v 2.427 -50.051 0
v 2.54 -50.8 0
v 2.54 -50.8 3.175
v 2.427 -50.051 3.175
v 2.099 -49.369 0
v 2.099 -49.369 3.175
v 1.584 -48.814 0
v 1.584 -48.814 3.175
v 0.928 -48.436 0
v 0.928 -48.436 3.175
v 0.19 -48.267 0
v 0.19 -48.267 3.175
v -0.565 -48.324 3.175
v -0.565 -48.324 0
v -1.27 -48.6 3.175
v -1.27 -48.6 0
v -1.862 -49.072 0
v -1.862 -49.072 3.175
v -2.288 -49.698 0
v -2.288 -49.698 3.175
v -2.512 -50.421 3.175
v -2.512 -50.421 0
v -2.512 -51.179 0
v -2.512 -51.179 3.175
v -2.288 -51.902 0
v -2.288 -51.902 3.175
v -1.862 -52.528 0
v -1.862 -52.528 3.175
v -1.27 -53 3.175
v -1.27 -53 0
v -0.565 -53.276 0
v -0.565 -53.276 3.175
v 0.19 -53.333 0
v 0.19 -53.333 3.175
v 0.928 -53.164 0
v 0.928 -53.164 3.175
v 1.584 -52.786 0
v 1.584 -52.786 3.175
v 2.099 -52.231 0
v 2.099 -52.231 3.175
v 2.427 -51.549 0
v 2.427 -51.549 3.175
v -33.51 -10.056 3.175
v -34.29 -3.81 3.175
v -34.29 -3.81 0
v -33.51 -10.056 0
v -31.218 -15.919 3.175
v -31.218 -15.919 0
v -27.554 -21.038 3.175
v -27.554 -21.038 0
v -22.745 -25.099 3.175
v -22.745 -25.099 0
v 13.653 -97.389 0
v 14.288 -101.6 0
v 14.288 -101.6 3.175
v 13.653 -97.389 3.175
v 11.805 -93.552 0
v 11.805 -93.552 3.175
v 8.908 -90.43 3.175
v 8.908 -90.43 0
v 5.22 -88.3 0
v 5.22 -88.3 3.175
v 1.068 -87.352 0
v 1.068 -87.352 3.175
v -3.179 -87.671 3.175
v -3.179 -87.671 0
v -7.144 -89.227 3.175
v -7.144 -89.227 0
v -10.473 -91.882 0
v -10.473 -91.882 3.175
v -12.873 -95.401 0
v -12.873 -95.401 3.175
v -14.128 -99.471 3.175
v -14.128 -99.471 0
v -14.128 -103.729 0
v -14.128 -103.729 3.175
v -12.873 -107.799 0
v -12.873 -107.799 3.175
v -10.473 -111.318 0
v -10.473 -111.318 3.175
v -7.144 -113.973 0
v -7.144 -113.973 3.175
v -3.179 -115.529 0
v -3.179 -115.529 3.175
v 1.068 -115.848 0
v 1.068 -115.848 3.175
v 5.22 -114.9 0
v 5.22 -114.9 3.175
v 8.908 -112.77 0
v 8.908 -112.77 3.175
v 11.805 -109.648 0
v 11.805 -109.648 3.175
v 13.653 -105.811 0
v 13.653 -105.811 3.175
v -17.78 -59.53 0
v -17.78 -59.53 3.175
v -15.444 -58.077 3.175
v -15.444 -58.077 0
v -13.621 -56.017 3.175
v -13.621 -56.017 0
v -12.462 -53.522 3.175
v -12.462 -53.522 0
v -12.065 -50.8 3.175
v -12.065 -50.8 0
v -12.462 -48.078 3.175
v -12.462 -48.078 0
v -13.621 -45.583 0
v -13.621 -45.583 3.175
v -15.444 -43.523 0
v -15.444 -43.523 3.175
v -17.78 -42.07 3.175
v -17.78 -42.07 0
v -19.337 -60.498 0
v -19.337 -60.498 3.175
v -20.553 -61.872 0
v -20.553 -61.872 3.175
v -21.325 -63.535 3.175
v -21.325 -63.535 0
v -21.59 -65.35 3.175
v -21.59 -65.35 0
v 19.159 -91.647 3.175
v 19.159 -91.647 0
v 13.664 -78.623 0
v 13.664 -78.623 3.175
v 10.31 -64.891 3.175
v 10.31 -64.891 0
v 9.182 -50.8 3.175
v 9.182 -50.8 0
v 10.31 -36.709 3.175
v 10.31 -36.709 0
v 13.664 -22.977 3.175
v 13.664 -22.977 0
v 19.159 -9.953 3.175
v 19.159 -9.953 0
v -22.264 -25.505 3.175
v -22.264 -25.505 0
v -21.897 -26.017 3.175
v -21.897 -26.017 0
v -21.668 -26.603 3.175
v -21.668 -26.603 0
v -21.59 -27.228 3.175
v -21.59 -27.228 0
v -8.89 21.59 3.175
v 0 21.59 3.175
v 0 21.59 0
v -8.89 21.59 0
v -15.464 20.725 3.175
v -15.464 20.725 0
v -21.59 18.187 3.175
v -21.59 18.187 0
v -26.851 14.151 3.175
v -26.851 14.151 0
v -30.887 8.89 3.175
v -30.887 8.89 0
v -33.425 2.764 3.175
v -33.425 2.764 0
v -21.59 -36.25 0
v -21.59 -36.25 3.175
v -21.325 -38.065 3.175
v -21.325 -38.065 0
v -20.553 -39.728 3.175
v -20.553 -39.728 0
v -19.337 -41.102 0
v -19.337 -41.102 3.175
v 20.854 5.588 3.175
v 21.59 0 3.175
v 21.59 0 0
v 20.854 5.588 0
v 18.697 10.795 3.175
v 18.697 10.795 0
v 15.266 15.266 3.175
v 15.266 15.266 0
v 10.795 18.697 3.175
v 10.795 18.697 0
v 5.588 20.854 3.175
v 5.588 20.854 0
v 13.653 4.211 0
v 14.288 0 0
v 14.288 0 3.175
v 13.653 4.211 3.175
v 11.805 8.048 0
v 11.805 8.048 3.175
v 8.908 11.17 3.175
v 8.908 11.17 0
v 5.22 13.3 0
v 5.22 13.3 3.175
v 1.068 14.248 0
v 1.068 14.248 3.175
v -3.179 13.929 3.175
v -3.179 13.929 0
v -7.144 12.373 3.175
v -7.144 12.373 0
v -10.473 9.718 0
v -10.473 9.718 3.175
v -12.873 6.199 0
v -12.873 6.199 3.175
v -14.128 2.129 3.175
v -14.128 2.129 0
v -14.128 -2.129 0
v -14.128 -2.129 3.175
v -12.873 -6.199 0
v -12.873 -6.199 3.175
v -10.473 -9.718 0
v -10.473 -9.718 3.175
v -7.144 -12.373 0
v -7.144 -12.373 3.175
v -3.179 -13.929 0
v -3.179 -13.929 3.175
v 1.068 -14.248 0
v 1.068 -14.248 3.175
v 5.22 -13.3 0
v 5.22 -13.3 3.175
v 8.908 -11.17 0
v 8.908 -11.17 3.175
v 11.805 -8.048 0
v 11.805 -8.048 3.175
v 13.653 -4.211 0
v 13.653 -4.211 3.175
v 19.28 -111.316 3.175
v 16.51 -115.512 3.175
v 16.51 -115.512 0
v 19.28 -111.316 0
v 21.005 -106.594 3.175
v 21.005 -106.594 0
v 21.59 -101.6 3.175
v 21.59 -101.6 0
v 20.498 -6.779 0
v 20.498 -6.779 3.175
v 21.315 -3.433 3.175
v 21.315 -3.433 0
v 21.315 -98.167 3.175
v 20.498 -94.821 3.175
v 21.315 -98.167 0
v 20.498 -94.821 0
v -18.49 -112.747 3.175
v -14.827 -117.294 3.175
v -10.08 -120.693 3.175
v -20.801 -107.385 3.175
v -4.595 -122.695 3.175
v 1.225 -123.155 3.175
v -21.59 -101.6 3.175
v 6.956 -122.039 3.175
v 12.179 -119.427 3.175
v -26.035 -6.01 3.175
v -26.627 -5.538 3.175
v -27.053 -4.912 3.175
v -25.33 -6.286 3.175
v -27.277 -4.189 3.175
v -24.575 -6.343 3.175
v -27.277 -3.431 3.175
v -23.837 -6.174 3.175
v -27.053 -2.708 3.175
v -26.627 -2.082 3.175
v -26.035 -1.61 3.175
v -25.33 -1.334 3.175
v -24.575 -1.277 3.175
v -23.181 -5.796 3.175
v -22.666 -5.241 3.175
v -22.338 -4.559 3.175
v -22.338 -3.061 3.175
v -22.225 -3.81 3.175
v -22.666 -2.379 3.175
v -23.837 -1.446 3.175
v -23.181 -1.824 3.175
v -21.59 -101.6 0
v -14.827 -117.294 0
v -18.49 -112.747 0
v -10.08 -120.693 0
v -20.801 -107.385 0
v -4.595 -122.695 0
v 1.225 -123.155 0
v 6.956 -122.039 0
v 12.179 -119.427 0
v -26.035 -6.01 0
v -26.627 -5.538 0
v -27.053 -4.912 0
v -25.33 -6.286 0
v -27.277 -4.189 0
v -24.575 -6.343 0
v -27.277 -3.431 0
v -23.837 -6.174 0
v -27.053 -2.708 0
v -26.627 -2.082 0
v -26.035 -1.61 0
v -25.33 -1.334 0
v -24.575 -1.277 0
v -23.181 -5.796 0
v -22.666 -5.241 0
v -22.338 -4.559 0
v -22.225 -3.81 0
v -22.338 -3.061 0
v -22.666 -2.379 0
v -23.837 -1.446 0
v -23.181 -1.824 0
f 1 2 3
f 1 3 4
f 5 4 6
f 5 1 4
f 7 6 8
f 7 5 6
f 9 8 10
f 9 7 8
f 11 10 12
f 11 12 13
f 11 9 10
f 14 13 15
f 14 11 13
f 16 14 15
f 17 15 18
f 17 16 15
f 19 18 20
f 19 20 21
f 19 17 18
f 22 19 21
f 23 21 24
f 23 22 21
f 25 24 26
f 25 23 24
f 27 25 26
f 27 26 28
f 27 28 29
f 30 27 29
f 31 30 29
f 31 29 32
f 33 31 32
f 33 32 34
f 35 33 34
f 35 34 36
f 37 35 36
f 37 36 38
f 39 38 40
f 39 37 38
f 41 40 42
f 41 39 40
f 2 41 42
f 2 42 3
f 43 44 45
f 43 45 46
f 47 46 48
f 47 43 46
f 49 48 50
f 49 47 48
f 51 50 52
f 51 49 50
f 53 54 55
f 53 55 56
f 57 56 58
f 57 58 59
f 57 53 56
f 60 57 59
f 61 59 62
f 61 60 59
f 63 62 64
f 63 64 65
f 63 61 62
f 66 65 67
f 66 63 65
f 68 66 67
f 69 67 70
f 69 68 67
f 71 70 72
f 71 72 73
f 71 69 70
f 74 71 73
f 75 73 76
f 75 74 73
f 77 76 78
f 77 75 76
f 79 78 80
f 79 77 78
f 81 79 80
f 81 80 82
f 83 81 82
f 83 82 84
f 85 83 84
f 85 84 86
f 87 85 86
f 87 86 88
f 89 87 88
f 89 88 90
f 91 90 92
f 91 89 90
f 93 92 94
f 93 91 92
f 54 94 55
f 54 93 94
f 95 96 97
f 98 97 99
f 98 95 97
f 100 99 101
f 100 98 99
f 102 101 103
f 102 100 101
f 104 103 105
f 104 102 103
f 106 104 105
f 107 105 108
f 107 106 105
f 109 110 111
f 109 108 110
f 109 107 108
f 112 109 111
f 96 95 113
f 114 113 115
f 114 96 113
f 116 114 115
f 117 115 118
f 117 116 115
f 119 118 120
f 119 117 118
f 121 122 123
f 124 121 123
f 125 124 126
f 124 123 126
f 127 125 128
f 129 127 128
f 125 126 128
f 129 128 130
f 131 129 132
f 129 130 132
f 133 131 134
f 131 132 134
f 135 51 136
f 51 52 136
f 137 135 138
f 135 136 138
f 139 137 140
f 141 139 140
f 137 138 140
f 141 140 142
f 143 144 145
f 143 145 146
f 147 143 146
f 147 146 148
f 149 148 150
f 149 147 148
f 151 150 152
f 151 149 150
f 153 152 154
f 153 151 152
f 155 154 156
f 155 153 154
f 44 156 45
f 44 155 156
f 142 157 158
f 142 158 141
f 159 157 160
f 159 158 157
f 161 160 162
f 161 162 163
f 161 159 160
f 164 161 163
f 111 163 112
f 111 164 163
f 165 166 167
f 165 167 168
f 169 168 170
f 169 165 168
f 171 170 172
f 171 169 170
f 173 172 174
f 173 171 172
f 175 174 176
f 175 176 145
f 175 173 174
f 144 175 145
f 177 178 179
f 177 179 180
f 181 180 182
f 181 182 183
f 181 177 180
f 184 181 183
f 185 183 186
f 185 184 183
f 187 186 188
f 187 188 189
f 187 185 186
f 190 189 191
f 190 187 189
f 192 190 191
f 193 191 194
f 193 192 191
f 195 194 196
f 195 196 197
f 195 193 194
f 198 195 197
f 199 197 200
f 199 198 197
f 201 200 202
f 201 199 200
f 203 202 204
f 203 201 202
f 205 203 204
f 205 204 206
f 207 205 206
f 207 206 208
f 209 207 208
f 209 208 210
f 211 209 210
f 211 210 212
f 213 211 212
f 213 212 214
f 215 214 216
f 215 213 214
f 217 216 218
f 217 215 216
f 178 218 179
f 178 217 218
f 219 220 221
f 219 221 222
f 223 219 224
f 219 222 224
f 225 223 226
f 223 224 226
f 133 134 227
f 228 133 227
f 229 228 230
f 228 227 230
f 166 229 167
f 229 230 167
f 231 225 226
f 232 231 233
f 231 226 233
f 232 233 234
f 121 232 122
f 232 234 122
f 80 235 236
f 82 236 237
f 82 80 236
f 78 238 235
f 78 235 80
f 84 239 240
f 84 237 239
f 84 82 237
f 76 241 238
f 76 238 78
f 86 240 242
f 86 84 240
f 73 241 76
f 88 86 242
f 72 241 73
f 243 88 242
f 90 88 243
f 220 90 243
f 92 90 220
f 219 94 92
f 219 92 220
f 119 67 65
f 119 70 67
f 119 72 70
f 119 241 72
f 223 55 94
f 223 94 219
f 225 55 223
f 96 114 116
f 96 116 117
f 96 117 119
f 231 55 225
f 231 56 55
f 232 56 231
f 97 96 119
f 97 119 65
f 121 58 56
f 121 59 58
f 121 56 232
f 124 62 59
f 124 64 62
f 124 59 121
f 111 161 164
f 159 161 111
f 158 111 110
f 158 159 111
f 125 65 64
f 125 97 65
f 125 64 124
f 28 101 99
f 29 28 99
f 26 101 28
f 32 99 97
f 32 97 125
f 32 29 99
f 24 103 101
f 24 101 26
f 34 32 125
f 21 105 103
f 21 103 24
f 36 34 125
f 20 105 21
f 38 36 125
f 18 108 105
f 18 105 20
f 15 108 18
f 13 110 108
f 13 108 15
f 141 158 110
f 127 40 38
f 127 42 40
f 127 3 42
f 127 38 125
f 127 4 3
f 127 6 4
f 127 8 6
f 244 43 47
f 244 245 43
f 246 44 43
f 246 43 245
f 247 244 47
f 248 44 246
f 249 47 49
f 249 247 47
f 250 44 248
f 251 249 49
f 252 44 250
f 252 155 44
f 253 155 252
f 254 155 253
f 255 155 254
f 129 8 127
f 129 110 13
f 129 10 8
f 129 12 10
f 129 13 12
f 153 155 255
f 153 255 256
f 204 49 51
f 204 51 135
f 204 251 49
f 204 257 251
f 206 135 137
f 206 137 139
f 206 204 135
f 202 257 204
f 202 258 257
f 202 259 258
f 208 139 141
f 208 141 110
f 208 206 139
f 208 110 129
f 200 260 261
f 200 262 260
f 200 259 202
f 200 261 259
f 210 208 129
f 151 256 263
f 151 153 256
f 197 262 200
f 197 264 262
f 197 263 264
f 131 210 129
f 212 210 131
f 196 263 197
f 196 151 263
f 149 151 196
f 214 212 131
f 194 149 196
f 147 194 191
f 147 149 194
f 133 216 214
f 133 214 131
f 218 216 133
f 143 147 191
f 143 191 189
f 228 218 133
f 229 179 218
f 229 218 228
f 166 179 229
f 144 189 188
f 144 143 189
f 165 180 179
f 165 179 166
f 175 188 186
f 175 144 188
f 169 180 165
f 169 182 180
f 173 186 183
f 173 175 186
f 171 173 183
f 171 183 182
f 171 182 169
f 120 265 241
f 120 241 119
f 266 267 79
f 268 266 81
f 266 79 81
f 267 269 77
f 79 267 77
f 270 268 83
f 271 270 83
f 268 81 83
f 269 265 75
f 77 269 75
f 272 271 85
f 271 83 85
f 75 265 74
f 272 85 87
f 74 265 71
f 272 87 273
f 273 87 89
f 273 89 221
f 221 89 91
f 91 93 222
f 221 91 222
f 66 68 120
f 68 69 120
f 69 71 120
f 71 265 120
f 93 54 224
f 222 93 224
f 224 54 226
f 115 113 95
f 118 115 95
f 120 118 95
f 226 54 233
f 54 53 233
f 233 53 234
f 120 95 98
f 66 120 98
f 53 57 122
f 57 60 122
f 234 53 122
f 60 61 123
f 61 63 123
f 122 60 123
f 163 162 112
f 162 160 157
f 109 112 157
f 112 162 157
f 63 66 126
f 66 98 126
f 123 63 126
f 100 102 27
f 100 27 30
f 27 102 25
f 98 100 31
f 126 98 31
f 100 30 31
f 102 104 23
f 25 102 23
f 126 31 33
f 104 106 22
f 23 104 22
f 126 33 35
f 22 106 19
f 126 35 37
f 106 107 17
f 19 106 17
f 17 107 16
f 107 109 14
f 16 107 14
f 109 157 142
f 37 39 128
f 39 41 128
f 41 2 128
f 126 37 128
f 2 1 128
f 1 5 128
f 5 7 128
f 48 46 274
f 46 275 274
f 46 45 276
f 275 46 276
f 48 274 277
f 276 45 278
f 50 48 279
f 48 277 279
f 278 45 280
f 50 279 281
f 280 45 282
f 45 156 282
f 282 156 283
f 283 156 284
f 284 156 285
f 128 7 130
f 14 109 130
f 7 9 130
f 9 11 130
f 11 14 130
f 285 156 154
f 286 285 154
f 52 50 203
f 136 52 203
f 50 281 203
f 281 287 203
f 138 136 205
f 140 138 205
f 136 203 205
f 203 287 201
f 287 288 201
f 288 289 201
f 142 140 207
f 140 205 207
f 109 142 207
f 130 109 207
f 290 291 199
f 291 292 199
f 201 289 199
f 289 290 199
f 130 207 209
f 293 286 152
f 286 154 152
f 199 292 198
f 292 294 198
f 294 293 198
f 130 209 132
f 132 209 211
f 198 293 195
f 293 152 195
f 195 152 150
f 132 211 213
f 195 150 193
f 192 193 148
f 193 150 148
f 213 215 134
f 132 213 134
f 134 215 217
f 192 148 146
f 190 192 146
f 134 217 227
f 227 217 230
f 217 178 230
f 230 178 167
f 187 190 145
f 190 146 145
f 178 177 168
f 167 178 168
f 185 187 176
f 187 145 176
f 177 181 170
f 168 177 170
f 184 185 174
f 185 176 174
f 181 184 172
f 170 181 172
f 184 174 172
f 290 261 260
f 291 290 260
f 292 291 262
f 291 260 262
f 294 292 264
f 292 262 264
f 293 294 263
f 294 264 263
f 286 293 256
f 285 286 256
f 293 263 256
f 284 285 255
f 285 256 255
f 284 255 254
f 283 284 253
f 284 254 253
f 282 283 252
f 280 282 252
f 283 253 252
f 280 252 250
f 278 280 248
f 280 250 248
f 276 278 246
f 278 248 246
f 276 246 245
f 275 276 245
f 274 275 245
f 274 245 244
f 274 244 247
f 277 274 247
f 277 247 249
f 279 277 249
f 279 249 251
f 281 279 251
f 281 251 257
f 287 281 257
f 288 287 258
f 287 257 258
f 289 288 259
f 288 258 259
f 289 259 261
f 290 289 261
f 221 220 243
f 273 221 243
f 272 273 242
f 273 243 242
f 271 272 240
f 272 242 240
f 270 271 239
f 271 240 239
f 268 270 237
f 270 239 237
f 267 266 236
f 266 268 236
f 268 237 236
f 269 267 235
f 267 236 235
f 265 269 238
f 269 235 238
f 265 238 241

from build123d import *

# Parameters (mm, degrees)
SKETCH1_R           = 14.2875
SKETCH1_R_2         = 2.54
BOSS_EXTRUDE1_DEPTH = 3.175
CUT_EXTRUDE1_DEPTH  = 162.674043733
FILLET3_R           = 6.35
SKETCH3_R           = 2.54
BOSS_EXTRUDE3_DEPTH = 3.175
SKETCH6_R           = 2.54
BOSS_EXTRUDE4_DEPTH = 3.175
FILLET2_R           = 6.35
CUT_EXTRUDE2_DEPTH  = 169.237022961
CUT_EXTRUDE3_DEPTH  = 169.237022961
CUT_EXTRUDE4_DEPTH  = 168.265702461
SKETCH15_R          = 2.54
BOSS_EXTRUDE8_DEPTH = 3.175
FILLET4_R           = 2.54


with BuildPart() as part:
    # Sketch1 → Boss-Extrude1 (new body)
    with BuildSketch(Plane.XY):
        with BuildLine():
            Line((-8.89, 25.4), (8.89, 25.4))
            ThreePointArc((8.89, 25.4), (17.870256121, 21.680256121), (21.59, 12.7))
            Line((21.59, 12.7), (21.59, -117.775079775))
            ThreePointArc((21.59, -117.775079775), (21.127743647, -120.388718212), (19.797058824, -122.685251408))
            Line((19.797058824, -122.685251408), (-7.952696208, -155.616779465))
            ThreePointArc((-7.952696208, -155.616779465), (-12.268297602, -157.851943494), (-16.900388255, -156.380852124))
            Line((-16.900388255, -156.380852124), (-32.439211784, -143.287061102))
            ThreePointArc((-32.439211784, -143.287061102), (-34.674375812, -138.971459708), (-33.203284443, -134.339369055))
            Line((-33.203284443, -134.339369055), (-23.382941176, -122.685251408))
            ThreePointArc((-23.382941176, -122.685251408), (-22.052256353, -120.388718212), (-21.59, -117.775079775))
            Line((-21.59, -117.775079775), (-21.59, 12.7))
            ThreePointArc((-21.59, 12.7), (-17.870256121, 21.680256121), (-8.89, 25.4))
        make_face()
        Circle(SKETCH1_R, mode=Mode.SUBTRACT)
        with Locations((0, -101.6)):
            Circle(SKETCH1_R, mode=Mode.SUBTRACT)
        with Locations((-18.532085478, -142.550133084)):
            Circle(SKETCH1_R_2, mode=Mode.SUBTRACT)
        with Locations((0, -50.8)):
            Circle(SKETCH1_R_2, mode=Mode.SUBTRACT)
    extrude(amount=BOSS_EXTRUDE1_DEPTH)

    # Sketch2 → Cut-Extrude1 (cut, through all)
    with BuildSketch(Plane.XY):
        with BuildLine():
            ThreePointArc((19.159083004, -91.647229609), (9.182340769, -50.8), (19.159083004, -9.952770391))
            ThreePointArc((19.159083004, -9.952770391), (20.973467787, -5.122670102), (21.59, 0))
            Line((21.59, 0), (27.94, 0))
            Line((27.94, 0), (27.94, -121.656687185))
            Line((27.94, -121.656687185), (-7.620284479, -163.8572221))
            Line((-7.620284479, -163.8572221), (-17.501317584, -155.874478972))
            Line((-17.501317584, -155.874478972), (16.51, -115.512152961))
            ThreePointArc((16.51, -115.512152961), (20.280273667, -109.005308906), (21.59, -101.6))
            ThreePointArc((21.59, -101.6), (20.973467787, -96.477329898), (19.159083004, -91.647229609))
        make_face()
        with BuildLine():
            Line((-21.59, -41.275), (-21.59, -60.325))
            ThreePointArc((-21.59, -60.325), (-12.065, -50.8), (-21.59, -41.275))
        make_face()
    extrude(amount=CUT_EXTRUDE1_DEPTH, mode=Mode.SUBTRACT)


with BuildPart() as cut_extrude1_piece_1:
    # of the separate pieces the step leaves, piece 1, a body of its own (cut_extrude1_pieces)
    add(part.part.solids().sort_by_distance((-8.89, 25.4, 0))[0])

    # Fillet3
    fillet3_edges = [cut_extrude1_piece_1.edges().sort_by_distance(p)[0] for p in [
        (-21.59, -41.275, 1.5875),
        (-21.59, -60.325, 1.5875),
    ]]
    fillet(fillet3_edges, radius=FILLET3_R)

    # Sketch3 → Boss-Extrude3 (add)
    with BuildSketch(Plane.XY.offset(3.175)):
        with BuildLine():
            Line((-27.351416194, -127.394768527), (-36.025496499, -137.688579))
            ThreePointArc((-36.025496499, -137.688579), (-37.217489152, -141.441859142), (-35.4063854, -144.93869507))
            Line((-35.4063854, -144.93869507), (-24.403104784, -154.210610454))
            ThreePointArc((-24.403104784, -154.210610454), (-19.771014132, -155.681701823), (-15.455412737, -153.446537795))
            Line((-15.455412737, -153.446537795), (-7.557639641, -144.073996091))
            Line((-7.557639641, -144.073996091), (-27.351416194, -127.394768527))
        make_face()
        with Locations((-18.532085478, -142.550133084)):
            Circle(SKETCH3_R, mode=Mode.SUBTRACT)
    extrude(amount=-BOSS_EXTRUDE3_DEPTH)

    # Sketch6 → Boss-Extrude4 (add)
    with BuildSketch(Plane.XY.offset(3.175)):
        Polygon((-35.4063854, -144.93869507), (-63.620410749, -121.164144113), (-51.344981666, -106.596497054), (-27.065569901, -127.055545526), align=None)
        with Locations((-52.626813855, -117.972130278)):
            Circle(SKETCH6_R, mode=Mode.SUBTRACT)
    extrude(amount=-BOSS_EXTRUDE4_DEPTH)

    # Fillet2
    fillet2_edges = [cut_extrude1_piece_1.edges().sort_by_distance(p)[0] for p in [
        (-63.620410749, -121.164144113, 1.5875),
        (-51.344981666, -106.596497054, 1.5875),
        (-27.065569901, -127.055545526, 1.5875),
    ]]
    fillet(fillet2_edges, radius=FILLET2_R)

    # Sketch7 → Cut-Extrude2 (cut, through all)
    with BuildSketch(Plane.XY.offset(3.175)):
        with BuildLine():
            Line((-21.59, 0), (-21.59, 31.75))
            Line((-21.59, 31.75), (21.59, 31.75))
            Line((21.59, 31.75), (21.59, 0))
            ThreePointArc((21.59, 0), (0, 21.59), (-21.59, 0))
        make_face()
    extrude(amount=-CUT_EXTRUDE2_DEPTH, mode=Mode.SUBTRACT)


with BuildPart() as cut_extrude1_piece_2:
    # of the separate pieces the step leaves, piece 2, a body of its own (cut_extrude1_pieces)
    add(part.part.solids().sort_by_distance((-16.900388255, -156.380852124, 0))[0])


with BuildPart() as cut_extrude3_tool:
    # Sketch10 → Cut-Extrude3 (new, through all)
    with BuildSketch(Plane.XY.offset(3.175)):
        with BuildLine():
            Line((-18.151882461, -155.32628042), (-17.361482582, -157.512020269))
            Line((-17.361482582, -157.512020269), (-14.375706423, -156.432313955))
            Line((-14.375706423, -156.432313955), (-15.455412737, -153.446537795))
            ThreePointArc((-15.455412737, -153.446537795), (-16.679911193, -154.563907595), (-18.151882461, -155.32628042))
        make_face()
    extrude(amount=-CUT_EXTRUDE3_DEPTH)


with BuildPart() as cut_extrude1_piece_1_1:
    add(cut_extrude1_piece_1.part)

    # Cut-Extrude3: cut by cut_extrude3_tool
    add(cut_extrude3_tool.part, mode=Mode.SUBTRACT)

    # Sketch12 → Cut-Extrude4 (cut, through all)
    with BuildSketch(Plane.XY.offset(3.175)):
        with BuildLine():
            Line((-21.59, -101.6), (-72.39, -101.6))
            Line((-72.39, -101.6), (-72.39, -165.1))
            Line((-72.39, -165.1), (16.51, -165.1))
            Line((16.51, -165.1), (16.51, -115.512152961))
            ThreePointArc((16.51, -115.512152961), (-7.405308906, -121.880273667), (-21.59, -101.6))
        make_face()
    extrude(amount=-CUT_EXTRUDE4_DEPTH, mode=Mode.SUBTRACT)

    # Sketch15 → Boss-Extrude8 (add)
    with BuildSketch(Plane.XY.offset(3.175)):
        with BuildLine():
            ThreePointArc((-34.29, -3.81), (-30.887045256, -16.51), (-21.59, -25.807045256))
            Line((-21.59, -25.807045256), (-21.59, 0))
            ThreePointArc((-21.59, 0), (-15.266435406, 15.266435406), (0, 21.59))
            Line((0, 21.59), (-8.89, 21.59))
            ThreePointArc((-8.89, 21.59), (-26.850512242, 14.150512242), (-34.29, -3.81))
        make_face()
        with Locations((-24.765, -3.81)):
            Circle(SKETCH15_R, mode=Mode.SUBTRACT)
    extrude(amount=-BOSS_EXTRUDE8_DEPTH)

    # Fillet4
    fillet4_edges = [cut_extrude1_piece_1_1.edges().sort_by_distance(p)[0] for p in [
        (-21.59, -25.807045256, 1.5875),
    ]]
    fillet(fillet4_edges, radius=FILLET4_R)


with BuildPart() as cut_extrude1_piece_2_1:
    add(cut_extrude1_piece_2.part)

    # Cut-Extrude3: cut by cut_extrude3_tool
    add(cut_extrude3_tool.part, mode=Mode.SUBTRACT)


solid = cut_extrude1_piece_1_1.part
